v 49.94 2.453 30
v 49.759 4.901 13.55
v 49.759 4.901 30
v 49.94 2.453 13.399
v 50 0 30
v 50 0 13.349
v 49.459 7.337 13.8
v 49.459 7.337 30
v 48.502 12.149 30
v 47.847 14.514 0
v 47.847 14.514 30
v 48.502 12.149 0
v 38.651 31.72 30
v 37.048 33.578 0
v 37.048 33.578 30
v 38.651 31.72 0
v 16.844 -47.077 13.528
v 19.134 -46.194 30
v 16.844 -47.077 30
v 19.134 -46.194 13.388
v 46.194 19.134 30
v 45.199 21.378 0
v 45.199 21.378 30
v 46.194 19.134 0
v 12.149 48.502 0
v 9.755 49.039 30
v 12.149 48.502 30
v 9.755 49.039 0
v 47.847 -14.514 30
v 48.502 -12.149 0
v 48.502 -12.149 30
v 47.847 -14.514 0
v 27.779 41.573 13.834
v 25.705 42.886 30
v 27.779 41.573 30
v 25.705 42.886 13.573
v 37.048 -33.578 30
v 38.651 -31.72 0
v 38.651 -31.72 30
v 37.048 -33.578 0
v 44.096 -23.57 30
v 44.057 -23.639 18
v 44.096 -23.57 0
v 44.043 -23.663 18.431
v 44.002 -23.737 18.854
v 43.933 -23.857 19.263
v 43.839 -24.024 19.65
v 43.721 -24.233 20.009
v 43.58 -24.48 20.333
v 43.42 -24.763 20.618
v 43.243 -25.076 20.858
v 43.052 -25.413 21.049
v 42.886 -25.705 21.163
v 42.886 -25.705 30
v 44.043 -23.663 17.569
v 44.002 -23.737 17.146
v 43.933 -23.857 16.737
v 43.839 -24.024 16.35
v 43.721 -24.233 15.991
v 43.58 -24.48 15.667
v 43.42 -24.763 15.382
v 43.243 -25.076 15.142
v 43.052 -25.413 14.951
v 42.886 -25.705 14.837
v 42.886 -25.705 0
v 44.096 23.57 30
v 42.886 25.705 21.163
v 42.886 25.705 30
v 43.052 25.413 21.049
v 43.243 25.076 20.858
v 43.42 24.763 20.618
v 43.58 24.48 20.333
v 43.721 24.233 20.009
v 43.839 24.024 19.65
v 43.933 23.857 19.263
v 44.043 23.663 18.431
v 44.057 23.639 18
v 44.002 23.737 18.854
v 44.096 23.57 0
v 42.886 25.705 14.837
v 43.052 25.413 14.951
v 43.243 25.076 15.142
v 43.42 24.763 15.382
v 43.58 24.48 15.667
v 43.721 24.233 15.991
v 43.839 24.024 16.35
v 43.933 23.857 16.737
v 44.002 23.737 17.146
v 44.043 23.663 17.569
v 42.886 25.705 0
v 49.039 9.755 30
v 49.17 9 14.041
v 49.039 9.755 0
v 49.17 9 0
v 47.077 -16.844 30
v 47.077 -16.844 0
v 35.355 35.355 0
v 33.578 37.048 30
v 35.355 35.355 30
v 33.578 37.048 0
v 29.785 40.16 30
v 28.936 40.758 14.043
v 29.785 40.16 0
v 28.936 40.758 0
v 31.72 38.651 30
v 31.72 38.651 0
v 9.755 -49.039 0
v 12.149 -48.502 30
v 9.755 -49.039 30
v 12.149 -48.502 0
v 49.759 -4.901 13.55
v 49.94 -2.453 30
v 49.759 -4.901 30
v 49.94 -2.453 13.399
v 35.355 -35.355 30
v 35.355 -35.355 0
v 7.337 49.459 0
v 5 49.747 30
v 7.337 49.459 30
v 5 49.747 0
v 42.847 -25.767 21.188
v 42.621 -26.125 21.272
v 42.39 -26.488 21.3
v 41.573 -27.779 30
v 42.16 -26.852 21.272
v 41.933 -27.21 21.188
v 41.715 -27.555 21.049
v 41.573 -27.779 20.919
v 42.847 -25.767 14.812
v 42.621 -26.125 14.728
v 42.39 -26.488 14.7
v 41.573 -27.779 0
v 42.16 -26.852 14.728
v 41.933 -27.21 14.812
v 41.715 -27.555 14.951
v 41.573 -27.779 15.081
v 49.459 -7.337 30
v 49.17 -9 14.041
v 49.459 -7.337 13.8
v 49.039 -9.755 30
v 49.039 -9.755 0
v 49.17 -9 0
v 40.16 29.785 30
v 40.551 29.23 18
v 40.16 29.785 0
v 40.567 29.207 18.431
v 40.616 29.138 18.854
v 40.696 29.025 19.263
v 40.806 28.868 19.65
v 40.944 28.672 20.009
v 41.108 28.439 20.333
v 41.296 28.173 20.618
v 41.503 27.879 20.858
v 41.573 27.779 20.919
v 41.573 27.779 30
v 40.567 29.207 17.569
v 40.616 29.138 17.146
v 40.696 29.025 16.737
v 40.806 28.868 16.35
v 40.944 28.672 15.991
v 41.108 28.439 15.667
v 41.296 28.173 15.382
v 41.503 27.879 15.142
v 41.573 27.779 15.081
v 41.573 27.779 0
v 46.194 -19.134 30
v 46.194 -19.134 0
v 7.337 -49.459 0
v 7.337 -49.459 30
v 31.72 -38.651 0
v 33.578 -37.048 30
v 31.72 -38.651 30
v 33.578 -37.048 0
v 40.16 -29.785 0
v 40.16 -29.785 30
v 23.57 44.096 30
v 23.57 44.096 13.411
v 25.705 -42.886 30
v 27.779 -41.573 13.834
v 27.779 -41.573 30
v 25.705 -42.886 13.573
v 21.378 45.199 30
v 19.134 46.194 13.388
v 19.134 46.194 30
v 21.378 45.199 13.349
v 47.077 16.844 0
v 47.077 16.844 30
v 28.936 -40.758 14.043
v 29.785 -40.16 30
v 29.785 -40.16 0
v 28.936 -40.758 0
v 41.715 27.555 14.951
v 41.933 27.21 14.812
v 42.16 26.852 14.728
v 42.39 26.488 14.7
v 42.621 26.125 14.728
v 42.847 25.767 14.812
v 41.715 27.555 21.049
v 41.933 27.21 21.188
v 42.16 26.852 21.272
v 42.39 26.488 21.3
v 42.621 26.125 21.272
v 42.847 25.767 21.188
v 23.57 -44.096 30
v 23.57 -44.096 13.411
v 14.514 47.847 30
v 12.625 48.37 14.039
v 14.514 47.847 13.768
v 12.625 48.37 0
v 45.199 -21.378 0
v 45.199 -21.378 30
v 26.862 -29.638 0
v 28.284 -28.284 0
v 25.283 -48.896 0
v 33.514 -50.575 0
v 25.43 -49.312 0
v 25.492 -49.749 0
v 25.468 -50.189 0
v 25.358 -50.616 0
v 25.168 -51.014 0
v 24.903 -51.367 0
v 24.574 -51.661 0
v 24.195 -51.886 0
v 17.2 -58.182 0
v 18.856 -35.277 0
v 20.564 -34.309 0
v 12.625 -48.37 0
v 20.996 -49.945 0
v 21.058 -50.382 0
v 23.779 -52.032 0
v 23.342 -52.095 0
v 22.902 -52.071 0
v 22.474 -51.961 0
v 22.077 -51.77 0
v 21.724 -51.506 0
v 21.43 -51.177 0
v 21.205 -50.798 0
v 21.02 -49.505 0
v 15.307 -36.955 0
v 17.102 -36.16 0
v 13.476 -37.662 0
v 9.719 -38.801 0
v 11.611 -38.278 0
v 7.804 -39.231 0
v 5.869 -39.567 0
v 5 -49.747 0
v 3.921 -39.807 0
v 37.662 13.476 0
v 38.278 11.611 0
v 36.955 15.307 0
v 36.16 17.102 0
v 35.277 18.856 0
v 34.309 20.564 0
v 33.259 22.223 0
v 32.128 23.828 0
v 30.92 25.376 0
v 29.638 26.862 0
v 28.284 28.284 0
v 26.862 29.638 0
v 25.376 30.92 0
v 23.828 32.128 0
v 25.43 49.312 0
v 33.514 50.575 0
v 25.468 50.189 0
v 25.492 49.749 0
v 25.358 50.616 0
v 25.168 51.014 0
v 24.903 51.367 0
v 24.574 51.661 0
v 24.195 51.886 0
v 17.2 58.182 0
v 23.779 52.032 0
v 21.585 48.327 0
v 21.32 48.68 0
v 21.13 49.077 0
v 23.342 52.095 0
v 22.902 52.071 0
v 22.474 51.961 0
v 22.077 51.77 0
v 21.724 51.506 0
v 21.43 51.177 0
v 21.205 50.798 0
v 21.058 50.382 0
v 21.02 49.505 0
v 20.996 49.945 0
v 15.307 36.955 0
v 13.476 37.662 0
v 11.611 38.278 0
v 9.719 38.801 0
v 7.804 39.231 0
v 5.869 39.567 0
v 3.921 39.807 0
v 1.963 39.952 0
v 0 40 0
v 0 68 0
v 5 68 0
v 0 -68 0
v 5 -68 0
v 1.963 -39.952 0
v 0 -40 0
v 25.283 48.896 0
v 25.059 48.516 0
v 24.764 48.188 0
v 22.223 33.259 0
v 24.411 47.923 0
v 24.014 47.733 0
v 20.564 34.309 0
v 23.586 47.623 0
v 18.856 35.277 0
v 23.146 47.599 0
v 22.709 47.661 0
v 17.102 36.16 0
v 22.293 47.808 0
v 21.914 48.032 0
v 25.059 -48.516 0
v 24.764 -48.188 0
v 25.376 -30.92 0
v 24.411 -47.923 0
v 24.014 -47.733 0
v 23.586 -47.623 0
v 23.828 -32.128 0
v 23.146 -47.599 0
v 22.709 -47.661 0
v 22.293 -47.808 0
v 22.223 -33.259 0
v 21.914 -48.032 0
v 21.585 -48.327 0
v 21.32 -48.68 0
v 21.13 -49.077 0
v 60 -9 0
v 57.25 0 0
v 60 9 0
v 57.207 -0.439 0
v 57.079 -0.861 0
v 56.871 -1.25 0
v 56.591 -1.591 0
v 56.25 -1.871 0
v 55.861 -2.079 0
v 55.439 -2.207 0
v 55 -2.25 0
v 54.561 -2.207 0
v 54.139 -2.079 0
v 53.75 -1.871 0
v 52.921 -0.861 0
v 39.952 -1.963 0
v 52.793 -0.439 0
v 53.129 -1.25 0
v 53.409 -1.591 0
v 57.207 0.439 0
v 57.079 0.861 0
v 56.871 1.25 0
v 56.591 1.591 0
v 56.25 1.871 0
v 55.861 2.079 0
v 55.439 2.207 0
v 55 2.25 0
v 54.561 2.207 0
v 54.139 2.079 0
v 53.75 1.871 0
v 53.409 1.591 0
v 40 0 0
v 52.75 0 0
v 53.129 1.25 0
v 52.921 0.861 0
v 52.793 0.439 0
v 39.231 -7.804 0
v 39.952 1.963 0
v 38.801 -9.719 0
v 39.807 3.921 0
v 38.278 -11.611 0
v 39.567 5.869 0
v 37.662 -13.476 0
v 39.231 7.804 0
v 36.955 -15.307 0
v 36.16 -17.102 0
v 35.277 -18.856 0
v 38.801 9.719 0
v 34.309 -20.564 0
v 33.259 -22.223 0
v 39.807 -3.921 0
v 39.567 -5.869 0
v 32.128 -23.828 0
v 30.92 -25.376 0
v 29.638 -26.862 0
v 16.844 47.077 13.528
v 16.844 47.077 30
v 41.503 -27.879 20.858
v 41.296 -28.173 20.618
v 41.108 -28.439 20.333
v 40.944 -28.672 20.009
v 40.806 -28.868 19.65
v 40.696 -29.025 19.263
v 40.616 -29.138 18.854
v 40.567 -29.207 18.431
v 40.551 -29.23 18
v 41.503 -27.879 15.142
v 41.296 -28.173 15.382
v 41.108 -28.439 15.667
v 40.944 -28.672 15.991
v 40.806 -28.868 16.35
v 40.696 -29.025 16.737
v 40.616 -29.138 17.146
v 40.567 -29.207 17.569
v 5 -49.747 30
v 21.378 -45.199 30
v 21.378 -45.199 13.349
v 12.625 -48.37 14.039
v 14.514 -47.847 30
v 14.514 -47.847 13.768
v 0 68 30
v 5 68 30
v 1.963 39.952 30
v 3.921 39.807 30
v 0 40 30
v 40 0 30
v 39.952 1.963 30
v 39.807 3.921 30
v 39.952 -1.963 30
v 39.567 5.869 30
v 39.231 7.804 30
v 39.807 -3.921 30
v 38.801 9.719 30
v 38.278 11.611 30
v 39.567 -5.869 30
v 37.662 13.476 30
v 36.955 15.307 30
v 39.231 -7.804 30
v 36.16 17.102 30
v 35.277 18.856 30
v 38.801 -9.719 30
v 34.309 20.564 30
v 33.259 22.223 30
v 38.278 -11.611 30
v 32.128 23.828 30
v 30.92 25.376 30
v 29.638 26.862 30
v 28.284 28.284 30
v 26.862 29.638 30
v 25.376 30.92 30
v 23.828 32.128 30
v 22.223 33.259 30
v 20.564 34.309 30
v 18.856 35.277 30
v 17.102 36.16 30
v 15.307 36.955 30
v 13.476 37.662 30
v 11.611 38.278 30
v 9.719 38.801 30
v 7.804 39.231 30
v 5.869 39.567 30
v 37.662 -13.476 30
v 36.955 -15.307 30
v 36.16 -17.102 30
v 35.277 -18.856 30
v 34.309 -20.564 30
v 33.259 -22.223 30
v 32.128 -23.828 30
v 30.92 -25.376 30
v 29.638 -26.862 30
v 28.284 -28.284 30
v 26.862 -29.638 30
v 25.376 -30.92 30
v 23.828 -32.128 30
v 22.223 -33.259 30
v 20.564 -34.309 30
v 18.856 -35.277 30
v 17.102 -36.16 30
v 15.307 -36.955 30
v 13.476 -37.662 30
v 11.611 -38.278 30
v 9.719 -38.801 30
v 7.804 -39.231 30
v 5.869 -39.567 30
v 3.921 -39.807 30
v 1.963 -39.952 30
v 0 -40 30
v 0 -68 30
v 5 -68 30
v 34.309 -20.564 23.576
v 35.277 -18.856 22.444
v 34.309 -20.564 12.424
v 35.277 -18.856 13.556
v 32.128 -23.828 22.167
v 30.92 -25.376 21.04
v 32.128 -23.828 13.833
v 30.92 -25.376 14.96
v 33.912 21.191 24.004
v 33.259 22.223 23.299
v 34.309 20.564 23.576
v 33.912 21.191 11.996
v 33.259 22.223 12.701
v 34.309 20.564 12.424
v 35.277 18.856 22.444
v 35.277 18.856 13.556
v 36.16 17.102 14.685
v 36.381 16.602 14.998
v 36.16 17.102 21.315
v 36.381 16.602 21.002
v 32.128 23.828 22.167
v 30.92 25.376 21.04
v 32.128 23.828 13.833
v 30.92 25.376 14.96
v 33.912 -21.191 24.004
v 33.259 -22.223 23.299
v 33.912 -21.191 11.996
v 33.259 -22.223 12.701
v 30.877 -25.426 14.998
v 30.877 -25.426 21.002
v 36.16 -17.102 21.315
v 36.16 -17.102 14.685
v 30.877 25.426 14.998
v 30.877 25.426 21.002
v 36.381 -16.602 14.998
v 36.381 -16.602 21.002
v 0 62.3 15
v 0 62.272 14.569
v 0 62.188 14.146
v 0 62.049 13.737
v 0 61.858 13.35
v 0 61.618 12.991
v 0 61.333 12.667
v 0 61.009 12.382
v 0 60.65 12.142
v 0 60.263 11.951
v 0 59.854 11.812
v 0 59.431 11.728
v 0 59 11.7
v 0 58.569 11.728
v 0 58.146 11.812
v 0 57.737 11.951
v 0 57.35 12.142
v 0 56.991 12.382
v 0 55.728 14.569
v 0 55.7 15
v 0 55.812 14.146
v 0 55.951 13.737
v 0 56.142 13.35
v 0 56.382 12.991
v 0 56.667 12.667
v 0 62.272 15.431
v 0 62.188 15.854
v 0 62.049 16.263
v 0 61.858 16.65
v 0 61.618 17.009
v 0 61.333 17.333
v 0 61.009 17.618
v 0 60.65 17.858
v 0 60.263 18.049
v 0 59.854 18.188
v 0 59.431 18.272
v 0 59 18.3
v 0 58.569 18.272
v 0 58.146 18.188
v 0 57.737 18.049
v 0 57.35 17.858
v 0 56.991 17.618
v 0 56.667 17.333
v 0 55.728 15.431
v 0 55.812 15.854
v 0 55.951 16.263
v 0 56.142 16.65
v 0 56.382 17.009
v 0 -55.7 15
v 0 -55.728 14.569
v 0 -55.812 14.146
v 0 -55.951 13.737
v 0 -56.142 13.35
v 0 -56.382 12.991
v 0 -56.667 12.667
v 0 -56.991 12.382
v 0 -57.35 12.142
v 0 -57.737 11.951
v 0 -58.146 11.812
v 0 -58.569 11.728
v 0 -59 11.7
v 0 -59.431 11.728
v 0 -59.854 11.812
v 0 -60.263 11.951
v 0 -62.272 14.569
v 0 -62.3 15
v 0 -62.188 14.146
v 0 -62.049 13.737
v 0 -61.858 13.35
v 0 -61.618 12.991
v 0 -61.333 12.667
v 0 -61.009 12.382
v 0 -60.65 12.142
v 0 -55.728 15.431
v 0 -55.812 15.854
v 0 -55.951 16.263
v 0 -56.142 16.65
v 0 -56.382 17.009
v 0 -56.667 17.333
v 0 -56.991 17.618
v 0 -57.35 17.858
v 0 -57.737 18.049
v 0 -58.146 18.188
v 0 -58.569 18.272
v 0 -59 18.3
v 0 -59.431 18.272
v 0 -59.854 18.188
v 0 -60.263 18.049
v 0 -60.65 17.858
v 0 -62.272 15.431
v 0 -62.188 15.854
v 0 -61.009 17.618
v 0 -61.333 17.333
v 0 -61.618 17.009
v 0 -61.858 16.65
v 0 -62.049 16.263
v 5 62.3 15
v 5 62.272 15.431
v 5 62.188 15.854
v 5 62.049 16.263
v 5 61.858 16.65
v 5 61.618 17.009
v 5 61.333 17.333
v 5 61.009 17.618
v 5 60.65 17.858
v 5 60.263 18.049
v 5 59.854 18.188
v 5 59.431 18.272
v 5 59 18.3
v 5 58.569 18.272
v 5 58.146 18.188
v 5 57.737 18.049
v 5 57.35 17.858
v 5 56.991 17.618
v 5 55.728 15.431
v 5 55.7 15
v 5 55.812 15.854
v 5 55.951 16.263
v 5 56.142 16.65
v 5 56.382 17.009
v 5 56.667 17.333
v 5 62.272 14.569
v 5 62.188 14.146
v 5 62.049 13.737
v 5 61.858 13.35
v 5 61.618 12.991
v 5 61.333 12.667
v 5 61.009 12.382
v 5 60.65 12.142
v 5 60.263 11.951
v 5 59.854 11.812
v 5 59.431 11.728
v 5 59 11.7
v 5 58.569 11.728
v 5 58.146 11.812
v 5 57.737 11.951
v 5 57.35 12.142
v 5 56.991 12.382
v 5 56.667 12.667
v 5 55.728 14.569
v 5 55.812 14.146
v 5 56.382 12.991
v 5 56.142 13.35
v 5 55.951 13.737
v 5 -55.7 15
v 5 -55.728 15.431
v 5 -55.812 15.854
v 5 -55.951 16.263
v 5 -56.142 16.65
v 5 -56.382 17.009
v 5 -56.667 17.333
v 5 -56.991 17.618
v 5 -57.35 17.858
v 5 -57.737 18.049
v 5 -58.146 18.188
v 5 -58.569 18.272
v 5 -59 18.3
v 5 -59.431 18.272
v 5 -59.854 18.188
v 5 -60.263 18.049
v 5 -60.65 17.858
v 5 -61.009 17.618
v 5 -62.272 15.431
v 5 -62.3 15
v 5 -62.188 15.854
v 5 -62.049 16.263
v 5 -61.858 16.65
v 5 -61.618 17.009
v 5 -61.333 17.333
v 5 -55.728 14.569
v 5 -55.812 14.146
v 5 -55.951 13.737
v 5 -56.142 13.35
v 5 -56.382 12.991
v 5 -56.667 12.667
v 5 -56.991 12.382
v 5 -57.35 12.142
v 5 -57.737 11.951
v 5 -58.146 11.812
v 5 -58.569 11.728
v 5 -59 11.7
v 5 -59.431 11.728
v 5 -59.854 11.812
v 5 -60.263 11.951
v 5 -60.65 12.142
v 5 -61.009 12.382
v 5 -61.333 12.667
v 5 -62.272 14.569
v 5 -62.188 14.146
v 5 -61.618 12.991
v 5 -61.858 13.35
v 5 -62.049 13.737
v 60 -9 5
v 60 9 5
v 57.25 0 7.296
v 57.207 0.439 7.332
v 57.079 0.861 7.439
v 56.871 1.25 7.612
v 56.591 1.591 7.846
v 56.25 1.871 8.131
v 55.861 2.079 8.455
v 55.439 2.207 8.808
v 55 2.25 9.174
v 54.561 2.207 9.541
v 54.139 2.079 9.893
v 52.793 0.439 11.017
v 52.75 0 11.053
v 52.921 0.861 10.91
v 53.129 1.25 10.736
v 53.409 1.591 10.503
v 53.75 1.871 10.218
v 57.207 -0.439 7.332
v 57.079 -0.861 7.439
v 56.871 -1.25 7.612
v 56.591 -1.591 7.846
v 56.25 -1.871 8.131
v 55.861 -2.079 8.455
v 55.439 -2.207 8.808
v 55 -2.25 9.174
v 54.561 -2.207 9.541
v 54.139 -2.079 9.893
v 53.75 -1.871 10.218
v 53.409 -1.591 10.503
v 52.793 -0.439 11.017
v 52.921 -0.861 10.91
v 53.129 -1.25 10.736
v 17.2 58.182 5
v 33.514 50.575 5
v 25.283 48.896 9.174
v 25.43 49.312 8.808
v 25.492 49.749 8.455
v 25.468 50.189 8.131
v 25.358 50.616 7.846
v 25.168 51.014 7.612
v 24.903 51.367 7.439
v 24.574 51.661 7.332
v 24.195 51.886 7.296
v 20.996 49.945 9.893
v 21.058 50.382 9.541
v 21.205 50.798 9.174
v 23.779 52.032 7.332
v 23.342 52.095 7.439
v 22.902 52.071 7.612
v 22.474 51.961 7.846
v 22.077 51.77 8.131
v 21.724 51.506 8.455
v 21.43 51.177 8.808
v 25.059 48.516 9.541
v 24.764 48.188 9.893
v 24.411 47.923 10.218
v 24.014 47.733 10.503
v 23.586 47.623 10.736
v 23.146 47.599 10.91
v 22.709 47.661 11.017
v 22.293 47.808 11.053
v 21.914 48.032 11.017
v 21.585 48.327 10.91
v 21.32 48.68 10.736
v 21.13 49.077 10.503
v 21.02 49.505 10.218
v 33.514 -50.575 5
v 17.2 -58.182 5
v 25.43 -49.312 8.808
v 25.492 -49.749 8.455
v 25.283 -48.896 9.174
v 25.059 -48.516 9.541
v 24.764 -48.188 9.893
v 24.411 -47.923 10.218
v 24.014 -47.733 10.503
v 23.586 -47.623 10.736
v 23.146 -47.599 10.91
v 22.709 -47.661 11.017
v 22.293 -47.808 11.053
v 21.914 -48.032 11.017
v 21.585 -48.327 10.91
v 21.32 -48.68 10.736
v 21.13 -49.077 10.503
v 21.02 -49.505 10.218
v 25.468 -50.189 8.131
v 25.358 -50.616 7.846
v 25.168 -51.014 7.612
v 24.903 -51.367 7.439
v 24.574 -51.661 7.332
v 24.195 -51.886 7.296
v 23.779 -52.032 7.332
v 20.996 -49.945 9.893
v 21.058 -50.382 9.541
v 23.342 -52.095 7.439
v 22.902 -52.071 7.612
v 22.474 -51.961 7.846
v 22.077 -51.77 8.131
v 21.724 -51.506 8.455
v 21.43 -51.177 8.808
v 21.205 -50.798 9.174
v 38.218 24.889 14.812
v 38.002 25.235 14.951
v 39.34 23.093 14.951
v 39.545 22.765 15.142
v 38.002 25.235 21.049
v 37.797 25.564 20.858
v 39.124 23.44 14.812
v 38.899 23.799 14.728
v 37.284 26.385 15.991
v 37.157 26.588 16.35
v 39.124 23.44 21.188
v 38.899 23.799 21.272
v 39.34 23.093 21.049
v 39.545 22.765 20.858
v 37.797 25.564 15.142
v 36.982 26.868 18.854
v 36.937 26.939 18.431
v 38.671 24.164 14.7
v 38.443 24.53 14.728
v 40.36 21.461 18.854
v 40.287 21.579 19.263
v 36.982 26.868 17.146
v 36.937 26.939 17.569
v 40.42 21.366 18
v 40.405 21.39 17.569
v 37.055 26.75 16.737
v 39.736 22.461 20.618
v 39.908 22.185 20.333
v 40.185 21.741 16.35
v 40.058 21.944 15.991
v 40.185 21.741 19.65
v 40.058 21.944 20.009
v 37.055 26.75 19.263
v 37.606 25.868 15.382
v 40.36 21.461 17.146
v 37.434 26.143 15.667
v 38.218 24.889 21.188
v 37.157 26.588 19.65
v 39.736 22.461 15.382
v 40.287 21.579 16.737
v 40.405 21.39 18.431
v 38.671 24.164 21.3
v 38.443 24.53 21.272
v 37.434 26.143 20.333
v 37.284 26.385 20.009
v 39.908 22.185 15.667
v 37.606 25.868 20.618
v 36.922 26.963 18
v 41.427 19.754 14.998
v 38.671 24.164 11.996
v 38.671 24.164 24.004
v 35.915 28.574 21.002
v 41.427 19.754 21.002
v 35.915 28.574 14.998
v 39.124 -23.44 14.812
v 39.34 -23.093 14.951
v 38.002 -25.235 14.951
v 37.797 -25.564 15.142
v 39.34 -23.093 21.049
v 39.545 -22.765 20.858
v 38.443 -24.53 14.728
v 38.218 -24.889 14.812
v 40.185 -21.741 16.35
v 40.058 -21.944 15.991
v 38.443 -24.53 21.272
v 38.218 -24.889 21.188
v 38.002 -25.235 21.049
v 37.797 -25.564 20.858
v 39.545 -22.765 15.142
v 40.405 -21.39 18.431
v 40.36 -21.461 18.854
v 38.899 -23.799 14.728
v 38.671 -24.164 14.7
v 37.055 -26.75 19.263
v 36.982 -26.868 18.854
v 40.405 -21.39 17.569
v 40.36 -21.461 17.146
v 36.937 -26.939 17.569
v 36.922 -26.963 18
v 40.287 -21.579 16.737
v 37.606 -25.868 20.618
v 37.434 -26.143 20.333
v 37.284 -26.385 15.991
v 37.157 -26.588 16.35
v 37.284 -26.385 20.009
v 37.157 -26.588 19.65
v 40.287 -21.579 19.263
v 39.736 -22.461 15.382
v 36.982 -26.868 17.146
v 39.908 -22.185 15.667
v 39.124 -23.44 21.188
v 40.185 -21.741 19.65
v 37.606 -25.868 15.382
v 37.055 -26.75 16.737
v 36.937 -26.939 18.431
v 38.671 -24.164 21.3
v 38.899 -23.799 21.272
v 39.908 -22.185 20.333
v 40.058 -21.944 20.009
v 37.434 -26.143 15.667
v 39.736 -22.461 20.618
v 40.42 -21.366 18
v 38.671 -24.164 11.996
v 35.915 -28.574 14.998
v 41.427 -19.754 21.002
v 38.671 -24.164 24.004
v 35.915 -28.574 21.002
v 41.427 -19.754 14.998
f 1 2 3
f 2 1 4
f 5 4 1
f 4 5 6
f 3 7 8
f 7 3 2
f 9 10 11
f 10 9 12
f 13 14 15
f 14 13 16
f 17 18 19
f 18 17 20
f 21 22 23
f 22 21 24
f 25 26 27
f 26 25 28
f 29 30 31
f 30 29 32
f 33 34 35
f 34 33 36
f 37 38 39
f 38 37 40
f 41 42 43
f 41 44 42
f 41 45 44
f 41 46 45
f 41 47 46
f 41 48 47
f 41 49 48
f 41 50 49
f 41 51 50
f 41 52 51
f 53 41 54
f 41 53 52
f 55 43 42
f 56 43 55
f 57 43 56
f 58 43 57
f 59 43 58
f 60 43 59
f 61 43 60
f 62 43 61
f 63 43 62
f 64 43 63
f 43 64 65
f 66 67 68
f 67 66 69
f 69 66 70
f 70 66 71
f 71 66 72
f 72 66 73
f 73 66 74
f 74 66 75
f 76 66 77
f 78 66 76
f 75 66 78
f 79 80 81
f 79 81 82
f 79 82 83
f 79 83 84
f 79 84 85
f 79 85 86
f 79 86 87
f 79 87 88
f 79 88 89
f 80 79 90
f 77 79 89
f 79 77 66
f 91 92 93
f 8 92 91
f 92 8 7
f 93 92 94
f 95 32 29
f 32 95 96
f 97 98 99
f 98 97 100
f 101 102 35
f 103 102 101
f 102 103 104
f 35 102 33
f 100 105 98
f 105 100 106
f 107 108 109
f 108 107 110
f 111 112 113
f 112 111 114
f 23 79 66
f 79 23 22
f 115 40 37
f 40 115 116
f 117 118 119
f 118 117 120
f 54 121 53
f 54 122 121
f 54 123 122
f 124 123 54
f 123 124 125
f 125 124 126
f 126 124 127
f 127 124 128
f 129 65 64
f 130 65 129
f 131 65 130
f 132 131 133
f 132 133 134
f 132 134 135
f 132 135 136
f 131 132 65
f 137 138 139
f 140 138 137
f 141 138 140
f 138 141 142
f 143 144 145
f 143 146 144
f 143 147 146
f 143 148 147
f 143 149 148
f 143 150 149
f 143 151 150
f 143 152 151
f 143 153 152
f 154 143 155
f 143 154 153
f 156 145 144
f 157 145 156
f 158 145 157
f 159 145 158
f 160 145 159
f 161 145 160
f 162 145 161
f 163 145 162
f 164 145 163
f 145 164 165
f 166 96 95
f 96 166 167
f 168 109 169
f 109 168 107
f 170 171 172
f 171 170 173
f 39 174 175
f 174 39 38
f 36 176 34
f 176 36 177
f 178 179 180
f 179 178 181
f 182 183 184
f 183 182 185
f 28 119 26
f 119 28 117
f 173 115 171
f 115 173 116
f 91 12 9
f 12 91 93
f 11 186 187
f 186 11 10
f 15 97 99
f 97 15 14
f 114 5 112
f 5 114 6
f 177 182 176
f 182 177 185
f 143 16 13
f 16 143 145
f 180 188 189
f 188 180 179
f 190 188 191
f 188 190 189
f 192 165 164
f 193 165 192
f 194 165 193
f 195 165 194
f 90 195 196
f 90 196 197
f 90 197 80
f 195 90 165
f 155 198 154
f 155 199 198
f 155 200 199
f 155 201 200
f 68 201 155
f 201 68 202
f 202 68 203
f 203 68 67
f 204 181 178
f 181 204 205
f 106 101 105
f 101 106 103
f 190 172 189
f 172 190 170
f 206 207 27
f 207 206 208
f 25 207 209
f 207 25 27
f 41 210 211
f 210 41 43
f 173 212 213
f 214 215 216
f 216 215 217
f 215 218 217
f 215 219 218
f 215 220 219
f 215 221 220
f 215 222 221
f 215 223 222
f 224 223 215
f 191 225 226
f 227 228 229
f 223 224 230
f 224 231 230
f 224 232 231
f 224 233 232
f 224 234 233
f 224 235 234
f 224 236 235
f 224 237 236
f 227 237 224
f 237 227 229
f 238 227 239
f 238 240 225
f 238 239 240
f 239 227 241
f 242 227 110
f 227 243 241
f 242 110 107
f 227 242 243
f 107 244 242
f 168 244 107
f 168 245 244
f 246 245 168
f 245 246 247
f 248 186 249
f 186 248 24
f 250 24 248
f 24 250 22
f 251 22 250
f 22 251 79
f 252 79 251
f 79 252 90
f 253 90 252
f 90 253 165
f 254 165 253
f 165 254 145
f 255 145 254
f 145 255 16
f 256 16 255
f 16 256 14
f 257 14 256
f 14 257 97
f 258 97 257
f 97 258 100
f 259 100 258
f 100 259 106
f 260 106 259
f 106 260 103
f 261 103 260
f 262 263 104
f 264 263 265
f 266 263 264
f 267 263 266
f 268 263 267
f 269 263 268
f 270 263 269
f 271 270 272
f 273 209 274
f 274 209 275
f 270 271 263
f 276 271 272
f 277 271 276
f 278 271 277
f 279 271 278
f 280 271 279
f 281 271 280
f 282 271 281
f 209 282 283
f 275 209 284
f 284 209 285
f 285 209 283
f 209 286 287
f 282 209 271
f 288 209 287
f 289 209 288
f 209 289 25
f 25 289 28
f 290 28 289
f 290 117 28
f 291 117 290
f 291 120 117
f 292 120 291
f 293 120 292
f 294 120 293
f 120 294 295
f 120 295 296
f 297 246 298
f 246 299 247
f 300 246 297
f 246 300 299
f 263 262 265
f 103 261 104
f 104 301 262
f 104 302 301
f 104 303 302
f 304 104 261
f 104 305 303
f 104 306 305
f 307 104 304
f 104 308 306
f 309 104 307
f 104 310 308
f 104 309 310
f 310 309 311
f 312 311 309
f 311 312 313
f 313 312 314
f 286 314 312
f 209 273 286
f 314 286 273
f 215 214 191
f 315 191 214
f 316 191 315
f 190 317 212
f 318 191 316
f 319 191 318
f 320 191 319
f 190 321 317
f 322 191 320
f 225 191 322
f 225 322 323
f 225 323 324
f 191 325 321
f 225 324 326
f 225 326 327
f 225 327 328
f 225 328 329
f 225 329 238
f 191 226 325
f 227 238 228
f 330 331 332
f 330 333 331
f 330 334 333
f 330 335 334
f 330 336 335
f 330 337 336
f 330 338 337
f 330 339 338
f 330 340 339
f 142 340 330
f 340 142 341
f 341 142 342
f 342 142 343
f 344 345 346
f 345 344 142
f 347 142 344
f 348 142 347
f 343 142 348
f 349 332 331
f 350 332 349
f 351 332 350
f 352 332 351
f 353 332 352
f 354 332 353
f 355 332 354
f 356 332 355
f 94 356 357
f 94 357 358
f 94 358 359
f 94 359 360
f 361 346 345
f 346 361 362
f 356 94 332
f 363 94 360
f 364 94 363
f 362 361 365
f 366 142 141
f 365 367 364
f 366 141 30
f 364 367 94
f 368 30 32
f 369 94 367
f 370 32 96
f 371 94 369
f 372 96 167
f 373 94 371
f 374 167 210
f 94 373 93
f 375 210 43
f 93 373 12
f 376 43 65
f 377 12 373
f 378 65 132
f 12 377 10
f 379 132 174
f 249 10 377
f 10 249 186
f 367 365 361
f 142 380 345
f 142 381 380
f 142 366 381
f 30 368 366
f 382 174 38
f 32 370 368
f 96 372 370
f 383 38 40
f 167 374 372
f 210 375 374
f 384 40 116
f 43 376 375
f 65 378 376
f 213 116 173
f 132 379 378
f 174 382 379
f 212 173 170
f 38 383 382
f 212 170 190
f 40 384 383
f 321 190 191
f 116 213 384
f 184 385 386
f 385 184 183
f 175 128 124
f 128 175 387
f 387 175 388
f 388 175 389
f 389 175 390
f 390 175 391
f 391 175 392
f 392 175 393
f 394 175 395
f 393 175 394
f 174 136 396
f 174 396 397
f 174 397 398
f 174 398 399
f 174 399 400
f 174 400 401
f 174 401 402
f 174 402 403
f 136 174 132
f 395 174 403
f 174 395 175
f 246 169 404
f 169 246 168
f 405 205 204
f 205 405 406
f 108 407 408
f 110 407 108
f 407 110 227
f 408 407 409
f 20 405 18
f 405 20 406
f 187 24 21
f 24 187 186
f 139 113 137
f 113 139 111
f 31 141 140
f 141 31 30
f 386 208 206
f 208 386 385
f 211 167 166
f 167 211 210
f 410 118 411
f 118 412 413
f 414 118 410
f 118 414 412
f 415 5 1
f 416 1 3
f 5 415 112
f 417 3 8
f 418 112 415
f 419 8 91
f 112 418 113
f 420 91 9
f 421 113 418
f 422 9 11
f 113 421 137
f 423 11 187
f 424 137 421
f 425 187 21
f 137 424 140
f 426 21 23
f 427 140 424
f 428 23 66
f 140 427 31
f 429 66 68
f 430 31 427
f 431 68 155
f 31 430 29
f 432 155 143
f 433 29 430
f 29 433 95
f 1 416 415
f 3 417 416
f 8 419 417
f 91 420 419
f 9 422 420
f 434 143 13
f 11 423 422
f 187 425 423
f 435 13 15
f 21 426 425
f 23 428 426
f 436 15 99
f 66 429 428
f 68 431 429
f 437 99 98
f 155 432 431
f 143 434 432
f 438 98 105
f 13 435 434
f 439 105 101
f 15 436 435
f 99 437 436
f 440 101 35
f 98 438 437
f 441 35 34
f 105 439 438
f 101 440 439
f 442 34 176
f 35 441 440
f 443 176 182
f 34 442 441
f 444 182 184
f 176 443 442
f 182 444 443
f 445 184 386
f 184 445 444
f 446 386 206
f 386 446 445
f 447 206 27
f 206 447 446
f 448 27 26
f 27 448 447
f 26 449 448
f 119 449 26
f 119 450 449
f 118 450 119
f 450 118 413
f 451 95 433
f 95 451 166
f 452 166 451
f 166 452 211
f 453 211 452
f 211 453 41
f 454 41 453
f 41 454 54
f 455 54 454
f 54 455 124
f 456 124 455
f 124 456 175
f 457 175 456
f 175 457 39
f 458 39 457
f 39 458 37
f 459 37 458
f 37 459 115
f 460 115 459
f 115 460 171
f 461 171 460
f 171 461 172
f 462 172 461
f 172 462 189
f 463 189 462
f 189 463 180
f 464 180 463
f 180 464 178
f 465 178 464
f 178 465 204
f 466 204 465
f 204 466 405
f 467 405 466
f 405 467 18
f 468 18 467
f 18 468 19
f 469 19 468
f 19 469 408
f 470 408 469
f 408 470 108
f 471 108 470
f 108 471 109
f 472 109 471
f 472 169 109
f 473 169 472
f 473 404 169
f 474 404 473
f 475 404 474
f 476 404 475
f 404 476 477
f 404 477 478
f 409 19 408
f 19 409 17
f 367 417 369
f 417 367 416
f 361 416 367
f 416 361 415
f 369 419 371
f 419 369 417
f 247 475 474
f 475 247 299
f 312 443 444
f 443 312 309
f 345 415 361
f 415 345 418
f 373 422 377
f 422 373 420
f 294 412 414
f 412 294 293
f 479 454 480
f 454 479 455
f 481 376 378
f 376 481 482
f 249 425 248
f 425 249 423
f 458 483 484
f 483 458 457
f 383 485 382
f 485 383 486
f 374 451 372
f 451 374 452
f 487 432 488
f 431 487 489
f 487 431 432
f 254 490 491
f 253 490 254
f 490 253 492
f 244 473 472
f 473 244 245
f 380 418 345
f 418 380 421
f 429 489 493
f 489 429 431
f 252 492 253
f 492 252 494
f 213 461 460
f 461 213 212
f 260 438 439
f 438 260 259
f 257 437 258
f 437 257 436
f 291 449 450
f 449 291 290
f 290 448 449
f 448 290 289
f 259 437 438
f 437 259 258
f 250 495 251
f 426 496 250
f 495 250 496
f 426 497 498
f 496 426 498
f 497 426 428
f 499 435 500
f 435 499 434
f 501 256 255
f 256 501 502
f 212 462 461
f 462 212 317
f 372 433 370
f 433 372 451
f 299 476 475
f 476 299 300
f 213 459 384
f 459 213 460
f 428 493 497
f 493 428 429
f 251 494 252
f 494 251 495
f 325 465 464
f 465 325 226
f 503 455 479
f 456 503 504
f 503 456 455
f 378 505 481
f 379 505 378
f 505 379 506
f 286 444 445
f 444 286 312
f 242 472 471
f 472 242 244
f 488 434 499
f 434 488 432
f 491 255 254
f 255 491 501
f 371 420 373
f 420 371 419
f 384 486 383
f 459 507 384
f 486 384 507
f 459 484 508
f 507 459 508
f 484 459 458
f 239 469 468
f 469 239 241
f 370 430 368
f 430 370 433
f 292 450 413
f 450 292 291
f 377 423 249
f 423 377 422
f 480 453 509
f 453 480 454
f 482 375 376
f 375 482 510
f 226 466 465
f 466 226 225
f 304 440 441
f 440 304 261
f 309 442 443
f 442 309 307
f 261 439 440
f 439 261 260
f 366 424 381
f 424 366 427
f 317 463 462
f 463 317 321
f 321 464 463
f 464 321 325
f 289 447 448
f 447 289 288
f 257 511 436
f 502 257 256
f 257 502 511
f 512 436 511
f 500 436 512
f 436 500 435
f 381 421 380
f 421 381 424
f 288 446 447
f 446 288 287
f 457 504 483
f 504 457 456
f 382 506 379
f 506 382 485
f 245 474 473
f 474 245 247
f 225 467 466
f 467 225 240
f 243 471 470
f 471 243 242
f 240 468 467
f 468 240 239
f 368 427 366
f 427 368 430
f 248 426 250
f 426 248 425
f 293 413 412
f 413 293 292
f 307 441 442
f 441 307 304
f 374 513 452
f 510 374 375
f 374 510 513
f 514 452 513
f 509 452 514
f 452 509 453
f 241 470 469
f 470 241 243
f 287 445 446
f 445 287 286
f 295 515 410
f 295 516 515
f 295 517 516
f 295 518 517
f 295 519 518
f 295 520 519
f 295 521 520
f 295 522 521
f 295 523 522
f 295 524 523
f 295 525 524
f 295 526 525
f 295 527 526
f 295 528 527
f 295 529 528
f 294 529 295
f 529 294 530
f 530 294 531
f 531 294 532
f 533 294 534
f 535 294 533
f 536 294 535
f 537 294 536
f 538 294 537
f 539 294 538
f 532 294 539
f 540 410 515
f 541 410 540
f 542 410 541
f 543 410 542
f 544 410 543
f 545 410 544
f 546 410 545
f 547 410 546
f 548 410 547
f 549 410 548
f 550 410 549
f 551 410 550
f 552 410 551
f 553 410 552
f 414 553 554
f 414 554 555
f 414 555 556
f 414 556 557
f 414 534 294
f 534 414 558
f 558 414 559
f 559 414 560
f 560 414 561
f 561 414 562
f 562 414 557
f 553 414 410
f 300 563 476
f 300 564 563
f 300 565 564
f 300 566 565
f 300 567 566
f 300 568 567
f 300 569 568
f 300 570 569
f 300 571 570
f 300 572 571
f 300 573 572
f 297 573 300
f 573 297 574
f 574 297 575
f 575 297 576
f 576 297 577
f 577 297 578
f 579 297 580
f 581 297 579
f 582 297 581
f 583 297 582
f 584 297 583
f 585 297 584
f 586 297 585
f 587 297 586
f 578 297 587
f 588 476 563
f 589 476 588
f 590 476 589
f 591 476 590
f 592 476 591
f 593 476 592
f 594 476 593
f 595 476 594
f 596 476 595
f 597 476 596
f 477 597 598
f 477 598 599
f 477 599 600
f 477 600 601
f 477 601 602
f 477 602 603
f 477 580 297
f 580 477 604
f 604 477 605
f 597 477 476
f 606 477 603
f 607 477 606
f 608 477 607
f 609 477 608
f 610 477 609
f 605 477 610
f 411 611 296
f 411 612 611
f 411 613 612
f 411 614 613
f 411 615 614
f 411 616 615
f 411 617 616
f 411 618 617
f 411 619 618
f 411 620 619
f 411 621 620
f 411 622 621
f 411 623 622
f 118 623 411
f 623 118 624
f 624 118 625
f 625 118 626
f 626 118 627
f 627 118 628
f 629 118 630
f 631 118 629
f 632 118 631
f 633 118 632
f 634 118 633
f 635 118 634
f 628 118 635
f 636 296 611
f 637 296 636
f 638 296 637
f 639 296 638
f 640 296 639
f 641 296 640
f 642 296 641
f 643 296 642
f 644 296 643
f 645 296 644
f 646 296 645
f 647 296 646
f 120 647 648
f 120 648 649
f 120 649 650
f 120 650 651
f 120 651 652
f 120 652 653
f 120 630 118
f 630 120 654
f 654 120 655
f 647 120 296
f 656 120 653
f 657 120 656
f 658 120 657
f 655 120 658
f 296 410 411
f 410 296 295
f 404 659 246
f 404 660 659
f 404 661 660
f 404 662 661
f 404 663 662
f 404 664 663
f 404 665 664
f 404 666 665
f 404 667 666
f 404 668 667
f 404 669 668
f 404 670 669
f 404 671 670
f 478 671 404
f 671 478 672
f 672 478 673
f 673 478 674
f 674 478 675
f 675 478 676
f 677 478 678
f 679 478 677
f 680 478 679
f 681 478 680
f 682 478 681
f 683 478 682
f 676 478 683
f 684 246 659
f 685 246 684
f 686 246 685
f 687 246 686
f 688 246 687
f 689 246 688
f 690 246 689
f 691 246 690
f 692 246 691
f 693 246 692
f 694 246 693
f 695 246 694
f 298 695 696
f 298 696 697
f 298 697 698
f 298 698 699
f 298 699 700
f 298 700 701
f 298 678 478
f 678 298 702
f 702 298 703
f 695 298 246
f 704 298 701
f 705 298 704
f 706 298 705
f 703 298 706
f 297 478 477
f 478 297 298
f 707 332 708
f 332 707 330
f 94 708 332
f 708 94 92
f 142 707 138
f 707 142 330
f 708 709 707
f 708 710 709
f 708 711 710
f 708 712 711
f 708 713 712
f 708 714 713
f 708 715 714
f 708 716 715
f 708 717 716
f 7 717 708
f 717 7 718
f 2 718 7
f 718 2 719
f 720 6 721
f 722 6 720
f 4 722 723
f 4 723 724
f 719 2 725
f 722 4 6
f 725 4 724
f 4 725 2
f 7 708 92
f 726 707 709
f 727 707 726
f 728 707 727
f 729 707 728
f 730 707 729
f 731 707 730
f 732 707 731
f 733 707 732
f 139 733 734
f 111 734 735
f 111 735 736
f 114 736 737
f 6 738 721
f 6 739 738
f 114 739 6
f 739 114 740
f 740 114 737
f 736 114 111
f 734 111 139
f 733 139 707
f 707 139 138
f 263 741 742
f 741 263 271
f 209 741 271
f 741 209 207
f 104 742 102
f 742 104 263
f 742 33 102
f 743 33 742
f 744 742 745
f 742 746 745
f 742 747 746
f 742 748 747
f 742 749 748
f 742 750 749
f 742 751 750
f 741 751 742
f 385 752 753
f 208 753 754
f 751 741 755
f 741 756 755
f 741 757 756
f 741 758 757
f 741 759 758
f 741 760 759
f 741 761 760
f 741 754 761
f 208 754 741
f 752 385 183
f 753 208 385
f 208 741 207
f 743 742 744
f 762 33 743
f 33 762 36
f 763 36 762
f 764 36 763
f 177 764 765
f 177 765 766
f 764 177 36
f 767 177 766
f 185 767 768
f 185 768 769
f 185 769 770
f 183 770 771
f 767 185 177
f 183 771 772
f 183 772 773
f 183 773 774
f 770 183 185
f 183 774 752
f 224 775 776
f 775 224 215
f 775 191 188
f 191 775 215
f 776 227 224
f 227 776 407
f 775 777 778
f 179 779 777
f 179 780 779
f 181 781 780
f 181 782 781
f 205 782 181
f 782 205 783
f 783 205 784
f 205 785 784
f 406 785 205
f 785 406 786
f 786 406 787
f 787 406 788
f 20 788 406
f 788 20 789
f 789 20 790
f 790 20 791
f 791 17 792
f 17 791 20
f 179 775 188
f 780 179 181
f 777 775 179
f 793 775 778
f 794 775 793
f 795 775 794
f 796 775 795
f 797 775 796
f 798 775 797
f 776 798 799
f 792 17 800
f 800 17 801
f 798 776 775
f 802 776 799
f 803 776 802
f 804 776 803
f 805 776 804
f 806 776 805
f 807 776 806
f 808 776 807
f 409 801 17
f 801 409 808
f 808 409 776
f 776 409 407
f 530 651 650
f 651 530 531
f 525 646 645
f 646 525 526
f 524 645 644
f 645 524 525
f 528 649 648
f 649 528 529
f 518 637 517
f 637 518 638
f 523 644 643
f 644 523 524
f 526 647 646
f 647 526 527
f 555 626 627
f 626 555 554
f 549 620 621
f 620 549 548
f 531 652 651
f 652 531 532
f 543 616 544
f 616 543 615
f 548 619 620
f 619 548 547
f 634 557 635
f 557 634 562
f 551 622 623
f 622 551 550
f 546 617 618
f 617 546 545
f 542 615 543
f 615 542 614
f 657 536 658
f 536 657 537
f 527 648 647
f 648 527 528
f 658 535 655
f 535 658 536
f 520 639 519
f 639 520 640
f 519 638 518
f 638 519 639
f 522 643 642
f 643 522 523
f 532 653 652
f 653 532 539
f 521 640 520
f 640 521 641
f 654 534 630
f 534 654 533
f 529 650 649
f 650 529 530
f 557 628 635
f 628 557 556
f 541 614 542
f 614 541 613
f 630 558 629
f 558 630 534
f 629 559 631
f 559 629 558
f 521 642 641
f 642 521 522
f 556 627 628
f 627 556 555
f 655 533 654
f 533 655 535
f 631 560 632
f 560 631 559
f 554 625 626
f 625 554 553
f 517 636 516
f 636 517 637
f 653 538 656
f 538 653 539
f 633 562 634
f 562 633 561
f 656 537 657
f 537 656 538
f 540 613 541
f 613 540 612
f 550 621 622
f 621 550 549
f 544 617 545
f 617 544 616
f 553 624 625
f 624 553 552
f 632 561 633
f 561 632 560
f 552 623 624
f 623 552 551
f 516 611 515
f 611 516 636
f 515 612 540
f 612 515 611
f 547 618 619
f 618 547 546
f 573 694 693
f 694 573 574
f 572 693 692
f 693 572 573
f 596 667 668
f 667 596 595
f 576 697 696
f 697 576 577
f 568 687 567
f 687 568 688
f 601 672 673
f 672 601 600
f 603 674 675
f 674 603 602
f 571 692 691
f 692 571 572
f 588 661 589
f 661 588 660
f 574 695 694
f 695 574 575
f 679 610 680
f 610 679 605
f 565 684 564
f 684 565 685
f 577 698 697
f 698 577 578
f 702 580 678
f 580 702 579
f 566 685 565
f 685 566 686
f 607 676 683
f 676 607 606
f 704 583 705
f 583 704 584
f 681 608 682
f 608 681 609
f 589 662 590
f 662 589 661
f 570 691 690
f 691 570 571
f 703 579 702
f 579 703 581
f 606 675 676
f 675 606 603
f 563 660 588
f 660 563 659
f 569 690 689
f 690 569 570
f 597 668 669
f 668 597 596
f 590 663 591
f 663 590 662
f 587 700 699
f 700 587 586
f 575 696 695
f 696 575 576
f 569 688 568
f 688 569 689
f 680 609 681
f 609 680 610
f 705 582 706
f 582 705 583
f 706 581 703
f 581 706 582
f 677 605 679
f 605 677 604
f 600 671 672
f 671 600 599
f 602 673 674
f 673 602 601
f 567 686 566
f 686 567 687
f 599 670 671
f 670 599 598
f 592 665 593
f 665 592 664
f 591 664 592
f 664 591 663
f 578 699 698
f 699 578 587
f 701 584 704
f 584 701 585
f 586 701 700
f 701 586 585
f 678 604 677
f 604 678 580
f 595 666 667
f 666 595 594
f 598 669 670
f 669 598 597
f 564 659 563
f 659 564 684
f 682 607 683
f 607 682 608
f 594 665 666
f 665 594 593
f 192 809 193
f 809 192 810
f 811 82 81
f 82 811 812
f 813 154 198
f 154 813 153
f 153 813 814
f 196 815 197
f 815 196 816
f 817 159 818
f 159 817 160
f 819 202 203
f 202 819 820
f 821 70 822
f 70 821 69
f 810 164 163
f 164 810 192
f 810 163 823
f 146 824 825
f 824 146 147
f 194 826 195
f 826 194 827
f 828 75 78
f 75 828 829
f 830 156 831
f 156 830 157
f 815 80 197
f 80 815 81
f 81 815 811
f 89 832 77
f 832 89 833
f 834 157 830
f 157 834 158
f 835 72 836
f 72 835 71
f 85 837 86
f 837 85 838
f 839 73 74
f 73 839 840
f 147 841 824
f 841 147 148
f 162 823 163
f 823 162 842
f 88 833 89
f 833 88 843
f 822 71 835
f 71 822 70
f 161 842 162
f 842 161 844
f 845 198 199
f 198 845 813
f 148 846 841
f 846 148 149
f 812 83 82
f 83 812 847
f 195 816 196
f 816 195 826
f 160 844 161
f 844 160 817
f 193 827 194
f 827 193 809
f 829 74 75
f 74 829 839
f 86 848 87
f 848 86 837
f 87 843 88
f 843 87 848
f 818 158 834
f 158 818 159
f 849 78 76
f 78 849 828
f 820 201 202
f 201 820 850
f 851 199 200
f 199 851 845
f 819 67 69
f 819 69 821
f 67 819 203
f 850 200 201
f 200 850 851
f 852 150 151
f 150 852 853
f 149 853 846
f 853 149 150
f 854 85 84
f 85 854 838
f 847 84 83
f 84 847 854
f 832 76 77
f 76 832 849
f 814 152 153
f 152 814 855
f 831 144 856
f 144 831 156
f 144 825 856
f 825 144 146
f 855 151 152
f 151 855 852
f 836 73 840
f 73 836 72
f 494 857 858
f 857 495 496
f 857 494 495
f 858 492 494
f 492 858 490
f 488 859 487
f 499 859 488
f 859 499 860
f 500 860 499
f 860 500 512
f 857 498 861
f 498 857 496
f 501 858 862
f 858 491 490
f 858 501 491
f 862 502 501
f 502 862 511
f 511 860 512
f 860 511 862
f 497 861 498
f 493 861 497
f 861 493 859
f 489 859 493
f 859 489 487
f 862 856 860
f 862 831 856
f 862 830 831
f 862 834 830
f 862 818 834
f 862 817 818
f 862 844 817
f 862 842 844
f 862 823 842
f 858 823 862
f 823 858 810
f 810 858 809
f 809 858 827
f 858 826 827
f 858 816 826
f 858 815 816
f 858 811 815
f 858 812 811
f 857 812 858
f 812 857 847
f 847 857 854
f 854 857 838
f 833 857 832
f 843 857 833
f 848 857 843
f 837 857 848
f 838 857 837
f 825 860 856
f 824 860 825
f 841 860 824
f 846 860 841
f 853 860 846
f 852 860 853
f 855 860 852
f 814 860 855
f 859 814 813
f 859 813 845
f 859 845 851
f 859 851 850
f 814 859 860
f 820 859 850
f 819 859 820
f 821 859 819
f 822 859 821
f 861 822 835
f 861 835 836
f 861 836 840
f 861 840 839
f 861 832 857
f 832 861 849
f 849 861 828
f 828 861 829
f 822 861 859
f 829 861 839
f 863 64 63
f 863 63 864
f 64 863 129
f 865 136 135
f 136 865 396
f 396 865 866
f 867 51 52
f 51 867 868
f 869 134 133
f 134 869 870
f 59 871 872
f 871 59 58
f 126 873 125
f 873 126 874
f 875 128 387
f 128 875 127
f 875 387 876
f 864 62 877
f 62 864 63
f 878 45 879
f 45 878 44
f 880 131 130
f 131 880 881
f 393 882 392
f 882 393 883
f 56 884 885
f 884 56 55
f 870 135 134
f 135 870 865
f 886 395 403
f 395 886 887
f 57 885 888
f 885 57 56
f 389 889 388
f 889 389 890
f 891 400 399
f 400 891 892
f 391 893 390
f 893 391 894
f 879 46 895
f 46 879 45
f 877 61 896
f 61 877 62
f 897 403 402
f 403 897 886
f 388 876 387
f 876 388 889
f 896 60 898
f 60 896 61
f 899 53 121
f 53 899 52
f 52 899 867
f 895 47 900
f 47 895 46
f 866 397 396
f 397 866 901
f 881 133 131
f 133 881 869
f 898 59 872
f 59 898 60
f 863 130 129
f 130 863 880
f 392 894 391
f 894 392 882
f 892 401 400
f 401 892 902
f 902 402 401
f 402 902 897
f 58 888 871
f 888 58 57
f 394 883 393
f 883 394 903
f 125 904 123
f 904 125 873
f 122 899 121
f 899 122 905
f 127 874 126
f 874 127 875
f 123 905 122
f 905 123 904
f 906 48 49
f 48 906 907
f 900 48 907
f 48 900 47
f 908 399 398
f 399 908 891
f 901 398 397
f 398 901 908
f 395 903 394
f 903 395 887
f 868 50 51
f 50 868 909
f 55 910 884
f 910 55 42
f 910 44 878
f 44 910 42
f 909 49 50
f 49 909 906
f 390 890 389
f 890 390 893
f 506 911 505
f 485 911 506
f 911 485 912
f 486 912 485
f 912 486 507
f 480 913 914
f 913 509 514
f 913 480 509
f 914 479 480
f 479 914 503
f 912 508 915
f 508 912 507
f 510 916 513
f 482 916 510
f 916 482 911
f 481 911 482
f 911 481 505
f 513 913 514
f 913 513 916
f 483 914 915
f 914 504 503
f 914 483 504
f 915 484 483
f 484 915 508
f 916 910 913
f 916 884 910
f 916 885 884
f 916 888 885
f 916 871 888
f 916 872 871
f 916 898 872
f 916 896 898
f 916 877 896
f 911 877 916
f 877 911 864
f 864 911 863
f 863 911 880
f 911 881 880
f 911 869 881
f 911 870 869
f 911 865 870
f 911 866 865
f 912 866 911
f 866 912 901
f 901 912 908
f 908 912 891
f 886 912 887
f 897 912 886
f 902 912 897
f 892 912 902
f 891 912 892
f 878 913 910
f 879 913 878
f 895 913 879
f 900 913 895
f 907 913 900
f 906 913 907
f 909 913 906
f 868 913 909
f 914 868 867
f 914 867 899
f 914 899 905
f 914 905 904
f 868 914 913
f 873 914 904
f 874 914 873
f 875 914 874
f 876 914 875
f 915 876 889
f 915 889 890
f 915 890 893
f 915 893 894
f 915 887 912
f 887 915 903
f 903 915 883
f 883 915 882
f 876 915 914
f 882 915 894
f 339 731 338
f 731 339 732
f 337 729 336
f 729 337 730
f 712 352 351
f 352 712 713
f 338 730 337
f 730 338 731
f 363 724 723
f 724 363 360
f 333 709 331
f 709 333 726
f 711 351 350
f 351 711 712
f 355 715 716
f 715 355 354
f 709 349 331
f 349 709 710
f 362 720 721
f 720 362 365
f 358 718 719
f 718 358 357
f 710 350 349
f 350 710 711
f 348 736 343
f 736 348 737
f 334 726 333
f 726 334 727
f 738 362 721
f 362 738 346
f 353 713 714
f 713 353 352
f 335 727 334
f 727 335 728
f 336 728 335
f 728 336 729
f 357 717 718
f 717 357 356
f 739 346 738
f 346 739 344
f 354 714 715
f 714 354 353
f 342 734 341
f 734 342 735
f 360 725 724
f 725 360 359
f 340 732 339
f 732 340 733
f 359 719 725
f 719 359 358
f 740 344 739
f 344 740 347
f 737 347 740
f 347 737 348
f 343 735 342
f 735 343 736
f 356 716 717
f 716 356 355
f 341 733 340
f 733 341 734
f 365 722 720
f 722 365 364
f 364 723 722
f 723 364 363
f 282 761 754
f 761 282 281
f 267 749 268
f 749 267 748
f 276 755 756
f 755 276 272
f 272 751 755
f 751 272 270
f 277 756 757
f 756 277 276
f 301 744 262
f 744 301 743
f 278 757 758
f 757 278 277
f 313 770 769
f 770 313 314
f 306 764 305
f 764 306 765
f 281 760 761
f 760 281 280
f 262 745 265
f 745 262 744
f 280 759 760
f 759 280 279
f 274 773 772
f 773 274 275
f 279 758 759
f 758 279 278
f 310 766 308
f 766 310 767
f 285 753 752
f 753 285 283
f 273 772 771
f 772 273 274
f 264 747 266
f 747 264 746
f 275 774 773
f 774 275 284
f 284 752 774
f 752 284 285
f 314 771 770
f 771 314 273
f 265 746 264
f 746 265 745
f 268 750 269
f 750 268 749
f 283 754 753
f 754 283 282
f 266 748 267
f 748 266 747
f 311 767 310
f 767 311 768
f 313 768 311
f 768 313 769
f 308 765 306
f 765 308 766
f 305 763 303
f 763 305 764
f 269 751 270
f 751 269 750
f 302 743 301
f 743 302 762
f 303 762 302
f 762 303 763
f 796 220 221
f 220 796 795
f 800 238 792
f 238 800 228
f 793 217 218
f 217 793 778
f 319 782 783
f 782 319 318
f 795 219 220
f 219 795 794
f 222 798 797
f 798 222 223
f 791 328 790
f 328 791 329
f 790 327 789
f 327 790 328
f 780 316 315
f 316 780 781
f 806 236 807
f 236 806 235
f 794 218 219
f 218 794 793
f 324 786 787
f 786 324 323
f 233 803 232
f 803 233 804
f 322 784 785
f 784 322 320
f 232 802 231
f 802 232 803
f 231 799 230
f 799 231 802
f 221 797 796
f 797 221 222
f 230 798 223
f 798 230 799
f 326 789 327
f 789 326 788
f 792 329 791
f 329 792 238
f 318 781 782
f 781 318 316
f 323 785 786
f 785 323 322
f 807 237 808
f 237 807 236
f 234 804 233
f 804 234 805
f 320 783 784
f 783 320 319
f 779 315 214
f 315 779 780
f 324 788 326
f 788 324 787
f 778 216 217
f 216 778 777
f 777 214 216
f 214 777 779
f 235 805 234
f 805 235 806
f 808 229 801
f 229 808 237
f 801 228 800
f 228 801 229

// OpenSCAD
// Tree shelf clamp - one half (print 2). Units: mm.
// Modelled in print orientation: shelf-side face on the bed (z=0).
$fn=128;
ri=40; ro=50; H=30;             // inner radius, outer radius, height
fl_t=5; fl_out=18;              // bolt-together flange: thickness, length past outer radius
tab_out=10; tab_t=5; tab_w=18;  // L-bracket tab: projection, thickness, width
tab_angs=[0,65,-65];
grip_ang=32;                    // grip bolt angle from centre line
grip_z=H-12;                    // grip bolt height from bed (12 mm below shelf face in use)
bolt_d=6.6;                     // M6 clearance
nut_af=10.4; nut_t=5.6;         // M6 nut pocket (10 mm AF + clearance)
screw_d=4.5;                    // wood screw clearance

module ring(){
  intersection(){
    difference(){ cylinder(r=ro,h=H); translate([0,0,-1]) cylinder(r=ri,h=H+2); }
    translate([0,-200,-1]) cube([400,400,H+2]);
  }
}
module tab(){
  translate([ro-2,-tab_w/2,0]) cube([tab_out+2,tab_w,tab_t]);
  // 45 deg gusset (self-supporting in this orientation)
  hull(){
    translate([ro-2,-tab_w/2,tab_t-0.01]) cube([tab_out+2,tab_w,0.01]);
    translate([ro-2,-tab_w/2,tab_t+tab_out]) cube([0.01,tab_w,0.01]);
  }
}
difference(){
  union(){
    ring();
    for(s=[1,-1]) translate([0, s>0?ri:-(ro+fl_out), 0]) cube([fl_t, ro+fl_out-ri, H]);
    for(a=tab_angs) rotate(a) tab();
  }
  for(s=[1,-1]) translate([-1, s*(ro+fl_out/2), H/2]) rotate([0,90,0]) cylinder(d=bolt_d,h=fl_t+2,$fn=48);
  for(s=[1,-1]) rotate(s*grip_ang) translate([0,0,grip_z]) {
    translate([ri-5,0,0]) rotate([0,90,0]) cylinder(d=bolt_d,h=ro-ri+20,$fn=48);
    // hex pocket, vertex pointing up for clean bridging
    translate([ri-1,0,0]) rotate([0,90,0]) cylinder(d=nut_af/cos(30),h=nut_t+1,$fn=6);
  }
  for(a=tab_angs) rotate(a) translate([ro+tab_out/2,0,-1]) cylinder(d=screw_d,h=tab_t+tab_out+2,$fn=32);
}
